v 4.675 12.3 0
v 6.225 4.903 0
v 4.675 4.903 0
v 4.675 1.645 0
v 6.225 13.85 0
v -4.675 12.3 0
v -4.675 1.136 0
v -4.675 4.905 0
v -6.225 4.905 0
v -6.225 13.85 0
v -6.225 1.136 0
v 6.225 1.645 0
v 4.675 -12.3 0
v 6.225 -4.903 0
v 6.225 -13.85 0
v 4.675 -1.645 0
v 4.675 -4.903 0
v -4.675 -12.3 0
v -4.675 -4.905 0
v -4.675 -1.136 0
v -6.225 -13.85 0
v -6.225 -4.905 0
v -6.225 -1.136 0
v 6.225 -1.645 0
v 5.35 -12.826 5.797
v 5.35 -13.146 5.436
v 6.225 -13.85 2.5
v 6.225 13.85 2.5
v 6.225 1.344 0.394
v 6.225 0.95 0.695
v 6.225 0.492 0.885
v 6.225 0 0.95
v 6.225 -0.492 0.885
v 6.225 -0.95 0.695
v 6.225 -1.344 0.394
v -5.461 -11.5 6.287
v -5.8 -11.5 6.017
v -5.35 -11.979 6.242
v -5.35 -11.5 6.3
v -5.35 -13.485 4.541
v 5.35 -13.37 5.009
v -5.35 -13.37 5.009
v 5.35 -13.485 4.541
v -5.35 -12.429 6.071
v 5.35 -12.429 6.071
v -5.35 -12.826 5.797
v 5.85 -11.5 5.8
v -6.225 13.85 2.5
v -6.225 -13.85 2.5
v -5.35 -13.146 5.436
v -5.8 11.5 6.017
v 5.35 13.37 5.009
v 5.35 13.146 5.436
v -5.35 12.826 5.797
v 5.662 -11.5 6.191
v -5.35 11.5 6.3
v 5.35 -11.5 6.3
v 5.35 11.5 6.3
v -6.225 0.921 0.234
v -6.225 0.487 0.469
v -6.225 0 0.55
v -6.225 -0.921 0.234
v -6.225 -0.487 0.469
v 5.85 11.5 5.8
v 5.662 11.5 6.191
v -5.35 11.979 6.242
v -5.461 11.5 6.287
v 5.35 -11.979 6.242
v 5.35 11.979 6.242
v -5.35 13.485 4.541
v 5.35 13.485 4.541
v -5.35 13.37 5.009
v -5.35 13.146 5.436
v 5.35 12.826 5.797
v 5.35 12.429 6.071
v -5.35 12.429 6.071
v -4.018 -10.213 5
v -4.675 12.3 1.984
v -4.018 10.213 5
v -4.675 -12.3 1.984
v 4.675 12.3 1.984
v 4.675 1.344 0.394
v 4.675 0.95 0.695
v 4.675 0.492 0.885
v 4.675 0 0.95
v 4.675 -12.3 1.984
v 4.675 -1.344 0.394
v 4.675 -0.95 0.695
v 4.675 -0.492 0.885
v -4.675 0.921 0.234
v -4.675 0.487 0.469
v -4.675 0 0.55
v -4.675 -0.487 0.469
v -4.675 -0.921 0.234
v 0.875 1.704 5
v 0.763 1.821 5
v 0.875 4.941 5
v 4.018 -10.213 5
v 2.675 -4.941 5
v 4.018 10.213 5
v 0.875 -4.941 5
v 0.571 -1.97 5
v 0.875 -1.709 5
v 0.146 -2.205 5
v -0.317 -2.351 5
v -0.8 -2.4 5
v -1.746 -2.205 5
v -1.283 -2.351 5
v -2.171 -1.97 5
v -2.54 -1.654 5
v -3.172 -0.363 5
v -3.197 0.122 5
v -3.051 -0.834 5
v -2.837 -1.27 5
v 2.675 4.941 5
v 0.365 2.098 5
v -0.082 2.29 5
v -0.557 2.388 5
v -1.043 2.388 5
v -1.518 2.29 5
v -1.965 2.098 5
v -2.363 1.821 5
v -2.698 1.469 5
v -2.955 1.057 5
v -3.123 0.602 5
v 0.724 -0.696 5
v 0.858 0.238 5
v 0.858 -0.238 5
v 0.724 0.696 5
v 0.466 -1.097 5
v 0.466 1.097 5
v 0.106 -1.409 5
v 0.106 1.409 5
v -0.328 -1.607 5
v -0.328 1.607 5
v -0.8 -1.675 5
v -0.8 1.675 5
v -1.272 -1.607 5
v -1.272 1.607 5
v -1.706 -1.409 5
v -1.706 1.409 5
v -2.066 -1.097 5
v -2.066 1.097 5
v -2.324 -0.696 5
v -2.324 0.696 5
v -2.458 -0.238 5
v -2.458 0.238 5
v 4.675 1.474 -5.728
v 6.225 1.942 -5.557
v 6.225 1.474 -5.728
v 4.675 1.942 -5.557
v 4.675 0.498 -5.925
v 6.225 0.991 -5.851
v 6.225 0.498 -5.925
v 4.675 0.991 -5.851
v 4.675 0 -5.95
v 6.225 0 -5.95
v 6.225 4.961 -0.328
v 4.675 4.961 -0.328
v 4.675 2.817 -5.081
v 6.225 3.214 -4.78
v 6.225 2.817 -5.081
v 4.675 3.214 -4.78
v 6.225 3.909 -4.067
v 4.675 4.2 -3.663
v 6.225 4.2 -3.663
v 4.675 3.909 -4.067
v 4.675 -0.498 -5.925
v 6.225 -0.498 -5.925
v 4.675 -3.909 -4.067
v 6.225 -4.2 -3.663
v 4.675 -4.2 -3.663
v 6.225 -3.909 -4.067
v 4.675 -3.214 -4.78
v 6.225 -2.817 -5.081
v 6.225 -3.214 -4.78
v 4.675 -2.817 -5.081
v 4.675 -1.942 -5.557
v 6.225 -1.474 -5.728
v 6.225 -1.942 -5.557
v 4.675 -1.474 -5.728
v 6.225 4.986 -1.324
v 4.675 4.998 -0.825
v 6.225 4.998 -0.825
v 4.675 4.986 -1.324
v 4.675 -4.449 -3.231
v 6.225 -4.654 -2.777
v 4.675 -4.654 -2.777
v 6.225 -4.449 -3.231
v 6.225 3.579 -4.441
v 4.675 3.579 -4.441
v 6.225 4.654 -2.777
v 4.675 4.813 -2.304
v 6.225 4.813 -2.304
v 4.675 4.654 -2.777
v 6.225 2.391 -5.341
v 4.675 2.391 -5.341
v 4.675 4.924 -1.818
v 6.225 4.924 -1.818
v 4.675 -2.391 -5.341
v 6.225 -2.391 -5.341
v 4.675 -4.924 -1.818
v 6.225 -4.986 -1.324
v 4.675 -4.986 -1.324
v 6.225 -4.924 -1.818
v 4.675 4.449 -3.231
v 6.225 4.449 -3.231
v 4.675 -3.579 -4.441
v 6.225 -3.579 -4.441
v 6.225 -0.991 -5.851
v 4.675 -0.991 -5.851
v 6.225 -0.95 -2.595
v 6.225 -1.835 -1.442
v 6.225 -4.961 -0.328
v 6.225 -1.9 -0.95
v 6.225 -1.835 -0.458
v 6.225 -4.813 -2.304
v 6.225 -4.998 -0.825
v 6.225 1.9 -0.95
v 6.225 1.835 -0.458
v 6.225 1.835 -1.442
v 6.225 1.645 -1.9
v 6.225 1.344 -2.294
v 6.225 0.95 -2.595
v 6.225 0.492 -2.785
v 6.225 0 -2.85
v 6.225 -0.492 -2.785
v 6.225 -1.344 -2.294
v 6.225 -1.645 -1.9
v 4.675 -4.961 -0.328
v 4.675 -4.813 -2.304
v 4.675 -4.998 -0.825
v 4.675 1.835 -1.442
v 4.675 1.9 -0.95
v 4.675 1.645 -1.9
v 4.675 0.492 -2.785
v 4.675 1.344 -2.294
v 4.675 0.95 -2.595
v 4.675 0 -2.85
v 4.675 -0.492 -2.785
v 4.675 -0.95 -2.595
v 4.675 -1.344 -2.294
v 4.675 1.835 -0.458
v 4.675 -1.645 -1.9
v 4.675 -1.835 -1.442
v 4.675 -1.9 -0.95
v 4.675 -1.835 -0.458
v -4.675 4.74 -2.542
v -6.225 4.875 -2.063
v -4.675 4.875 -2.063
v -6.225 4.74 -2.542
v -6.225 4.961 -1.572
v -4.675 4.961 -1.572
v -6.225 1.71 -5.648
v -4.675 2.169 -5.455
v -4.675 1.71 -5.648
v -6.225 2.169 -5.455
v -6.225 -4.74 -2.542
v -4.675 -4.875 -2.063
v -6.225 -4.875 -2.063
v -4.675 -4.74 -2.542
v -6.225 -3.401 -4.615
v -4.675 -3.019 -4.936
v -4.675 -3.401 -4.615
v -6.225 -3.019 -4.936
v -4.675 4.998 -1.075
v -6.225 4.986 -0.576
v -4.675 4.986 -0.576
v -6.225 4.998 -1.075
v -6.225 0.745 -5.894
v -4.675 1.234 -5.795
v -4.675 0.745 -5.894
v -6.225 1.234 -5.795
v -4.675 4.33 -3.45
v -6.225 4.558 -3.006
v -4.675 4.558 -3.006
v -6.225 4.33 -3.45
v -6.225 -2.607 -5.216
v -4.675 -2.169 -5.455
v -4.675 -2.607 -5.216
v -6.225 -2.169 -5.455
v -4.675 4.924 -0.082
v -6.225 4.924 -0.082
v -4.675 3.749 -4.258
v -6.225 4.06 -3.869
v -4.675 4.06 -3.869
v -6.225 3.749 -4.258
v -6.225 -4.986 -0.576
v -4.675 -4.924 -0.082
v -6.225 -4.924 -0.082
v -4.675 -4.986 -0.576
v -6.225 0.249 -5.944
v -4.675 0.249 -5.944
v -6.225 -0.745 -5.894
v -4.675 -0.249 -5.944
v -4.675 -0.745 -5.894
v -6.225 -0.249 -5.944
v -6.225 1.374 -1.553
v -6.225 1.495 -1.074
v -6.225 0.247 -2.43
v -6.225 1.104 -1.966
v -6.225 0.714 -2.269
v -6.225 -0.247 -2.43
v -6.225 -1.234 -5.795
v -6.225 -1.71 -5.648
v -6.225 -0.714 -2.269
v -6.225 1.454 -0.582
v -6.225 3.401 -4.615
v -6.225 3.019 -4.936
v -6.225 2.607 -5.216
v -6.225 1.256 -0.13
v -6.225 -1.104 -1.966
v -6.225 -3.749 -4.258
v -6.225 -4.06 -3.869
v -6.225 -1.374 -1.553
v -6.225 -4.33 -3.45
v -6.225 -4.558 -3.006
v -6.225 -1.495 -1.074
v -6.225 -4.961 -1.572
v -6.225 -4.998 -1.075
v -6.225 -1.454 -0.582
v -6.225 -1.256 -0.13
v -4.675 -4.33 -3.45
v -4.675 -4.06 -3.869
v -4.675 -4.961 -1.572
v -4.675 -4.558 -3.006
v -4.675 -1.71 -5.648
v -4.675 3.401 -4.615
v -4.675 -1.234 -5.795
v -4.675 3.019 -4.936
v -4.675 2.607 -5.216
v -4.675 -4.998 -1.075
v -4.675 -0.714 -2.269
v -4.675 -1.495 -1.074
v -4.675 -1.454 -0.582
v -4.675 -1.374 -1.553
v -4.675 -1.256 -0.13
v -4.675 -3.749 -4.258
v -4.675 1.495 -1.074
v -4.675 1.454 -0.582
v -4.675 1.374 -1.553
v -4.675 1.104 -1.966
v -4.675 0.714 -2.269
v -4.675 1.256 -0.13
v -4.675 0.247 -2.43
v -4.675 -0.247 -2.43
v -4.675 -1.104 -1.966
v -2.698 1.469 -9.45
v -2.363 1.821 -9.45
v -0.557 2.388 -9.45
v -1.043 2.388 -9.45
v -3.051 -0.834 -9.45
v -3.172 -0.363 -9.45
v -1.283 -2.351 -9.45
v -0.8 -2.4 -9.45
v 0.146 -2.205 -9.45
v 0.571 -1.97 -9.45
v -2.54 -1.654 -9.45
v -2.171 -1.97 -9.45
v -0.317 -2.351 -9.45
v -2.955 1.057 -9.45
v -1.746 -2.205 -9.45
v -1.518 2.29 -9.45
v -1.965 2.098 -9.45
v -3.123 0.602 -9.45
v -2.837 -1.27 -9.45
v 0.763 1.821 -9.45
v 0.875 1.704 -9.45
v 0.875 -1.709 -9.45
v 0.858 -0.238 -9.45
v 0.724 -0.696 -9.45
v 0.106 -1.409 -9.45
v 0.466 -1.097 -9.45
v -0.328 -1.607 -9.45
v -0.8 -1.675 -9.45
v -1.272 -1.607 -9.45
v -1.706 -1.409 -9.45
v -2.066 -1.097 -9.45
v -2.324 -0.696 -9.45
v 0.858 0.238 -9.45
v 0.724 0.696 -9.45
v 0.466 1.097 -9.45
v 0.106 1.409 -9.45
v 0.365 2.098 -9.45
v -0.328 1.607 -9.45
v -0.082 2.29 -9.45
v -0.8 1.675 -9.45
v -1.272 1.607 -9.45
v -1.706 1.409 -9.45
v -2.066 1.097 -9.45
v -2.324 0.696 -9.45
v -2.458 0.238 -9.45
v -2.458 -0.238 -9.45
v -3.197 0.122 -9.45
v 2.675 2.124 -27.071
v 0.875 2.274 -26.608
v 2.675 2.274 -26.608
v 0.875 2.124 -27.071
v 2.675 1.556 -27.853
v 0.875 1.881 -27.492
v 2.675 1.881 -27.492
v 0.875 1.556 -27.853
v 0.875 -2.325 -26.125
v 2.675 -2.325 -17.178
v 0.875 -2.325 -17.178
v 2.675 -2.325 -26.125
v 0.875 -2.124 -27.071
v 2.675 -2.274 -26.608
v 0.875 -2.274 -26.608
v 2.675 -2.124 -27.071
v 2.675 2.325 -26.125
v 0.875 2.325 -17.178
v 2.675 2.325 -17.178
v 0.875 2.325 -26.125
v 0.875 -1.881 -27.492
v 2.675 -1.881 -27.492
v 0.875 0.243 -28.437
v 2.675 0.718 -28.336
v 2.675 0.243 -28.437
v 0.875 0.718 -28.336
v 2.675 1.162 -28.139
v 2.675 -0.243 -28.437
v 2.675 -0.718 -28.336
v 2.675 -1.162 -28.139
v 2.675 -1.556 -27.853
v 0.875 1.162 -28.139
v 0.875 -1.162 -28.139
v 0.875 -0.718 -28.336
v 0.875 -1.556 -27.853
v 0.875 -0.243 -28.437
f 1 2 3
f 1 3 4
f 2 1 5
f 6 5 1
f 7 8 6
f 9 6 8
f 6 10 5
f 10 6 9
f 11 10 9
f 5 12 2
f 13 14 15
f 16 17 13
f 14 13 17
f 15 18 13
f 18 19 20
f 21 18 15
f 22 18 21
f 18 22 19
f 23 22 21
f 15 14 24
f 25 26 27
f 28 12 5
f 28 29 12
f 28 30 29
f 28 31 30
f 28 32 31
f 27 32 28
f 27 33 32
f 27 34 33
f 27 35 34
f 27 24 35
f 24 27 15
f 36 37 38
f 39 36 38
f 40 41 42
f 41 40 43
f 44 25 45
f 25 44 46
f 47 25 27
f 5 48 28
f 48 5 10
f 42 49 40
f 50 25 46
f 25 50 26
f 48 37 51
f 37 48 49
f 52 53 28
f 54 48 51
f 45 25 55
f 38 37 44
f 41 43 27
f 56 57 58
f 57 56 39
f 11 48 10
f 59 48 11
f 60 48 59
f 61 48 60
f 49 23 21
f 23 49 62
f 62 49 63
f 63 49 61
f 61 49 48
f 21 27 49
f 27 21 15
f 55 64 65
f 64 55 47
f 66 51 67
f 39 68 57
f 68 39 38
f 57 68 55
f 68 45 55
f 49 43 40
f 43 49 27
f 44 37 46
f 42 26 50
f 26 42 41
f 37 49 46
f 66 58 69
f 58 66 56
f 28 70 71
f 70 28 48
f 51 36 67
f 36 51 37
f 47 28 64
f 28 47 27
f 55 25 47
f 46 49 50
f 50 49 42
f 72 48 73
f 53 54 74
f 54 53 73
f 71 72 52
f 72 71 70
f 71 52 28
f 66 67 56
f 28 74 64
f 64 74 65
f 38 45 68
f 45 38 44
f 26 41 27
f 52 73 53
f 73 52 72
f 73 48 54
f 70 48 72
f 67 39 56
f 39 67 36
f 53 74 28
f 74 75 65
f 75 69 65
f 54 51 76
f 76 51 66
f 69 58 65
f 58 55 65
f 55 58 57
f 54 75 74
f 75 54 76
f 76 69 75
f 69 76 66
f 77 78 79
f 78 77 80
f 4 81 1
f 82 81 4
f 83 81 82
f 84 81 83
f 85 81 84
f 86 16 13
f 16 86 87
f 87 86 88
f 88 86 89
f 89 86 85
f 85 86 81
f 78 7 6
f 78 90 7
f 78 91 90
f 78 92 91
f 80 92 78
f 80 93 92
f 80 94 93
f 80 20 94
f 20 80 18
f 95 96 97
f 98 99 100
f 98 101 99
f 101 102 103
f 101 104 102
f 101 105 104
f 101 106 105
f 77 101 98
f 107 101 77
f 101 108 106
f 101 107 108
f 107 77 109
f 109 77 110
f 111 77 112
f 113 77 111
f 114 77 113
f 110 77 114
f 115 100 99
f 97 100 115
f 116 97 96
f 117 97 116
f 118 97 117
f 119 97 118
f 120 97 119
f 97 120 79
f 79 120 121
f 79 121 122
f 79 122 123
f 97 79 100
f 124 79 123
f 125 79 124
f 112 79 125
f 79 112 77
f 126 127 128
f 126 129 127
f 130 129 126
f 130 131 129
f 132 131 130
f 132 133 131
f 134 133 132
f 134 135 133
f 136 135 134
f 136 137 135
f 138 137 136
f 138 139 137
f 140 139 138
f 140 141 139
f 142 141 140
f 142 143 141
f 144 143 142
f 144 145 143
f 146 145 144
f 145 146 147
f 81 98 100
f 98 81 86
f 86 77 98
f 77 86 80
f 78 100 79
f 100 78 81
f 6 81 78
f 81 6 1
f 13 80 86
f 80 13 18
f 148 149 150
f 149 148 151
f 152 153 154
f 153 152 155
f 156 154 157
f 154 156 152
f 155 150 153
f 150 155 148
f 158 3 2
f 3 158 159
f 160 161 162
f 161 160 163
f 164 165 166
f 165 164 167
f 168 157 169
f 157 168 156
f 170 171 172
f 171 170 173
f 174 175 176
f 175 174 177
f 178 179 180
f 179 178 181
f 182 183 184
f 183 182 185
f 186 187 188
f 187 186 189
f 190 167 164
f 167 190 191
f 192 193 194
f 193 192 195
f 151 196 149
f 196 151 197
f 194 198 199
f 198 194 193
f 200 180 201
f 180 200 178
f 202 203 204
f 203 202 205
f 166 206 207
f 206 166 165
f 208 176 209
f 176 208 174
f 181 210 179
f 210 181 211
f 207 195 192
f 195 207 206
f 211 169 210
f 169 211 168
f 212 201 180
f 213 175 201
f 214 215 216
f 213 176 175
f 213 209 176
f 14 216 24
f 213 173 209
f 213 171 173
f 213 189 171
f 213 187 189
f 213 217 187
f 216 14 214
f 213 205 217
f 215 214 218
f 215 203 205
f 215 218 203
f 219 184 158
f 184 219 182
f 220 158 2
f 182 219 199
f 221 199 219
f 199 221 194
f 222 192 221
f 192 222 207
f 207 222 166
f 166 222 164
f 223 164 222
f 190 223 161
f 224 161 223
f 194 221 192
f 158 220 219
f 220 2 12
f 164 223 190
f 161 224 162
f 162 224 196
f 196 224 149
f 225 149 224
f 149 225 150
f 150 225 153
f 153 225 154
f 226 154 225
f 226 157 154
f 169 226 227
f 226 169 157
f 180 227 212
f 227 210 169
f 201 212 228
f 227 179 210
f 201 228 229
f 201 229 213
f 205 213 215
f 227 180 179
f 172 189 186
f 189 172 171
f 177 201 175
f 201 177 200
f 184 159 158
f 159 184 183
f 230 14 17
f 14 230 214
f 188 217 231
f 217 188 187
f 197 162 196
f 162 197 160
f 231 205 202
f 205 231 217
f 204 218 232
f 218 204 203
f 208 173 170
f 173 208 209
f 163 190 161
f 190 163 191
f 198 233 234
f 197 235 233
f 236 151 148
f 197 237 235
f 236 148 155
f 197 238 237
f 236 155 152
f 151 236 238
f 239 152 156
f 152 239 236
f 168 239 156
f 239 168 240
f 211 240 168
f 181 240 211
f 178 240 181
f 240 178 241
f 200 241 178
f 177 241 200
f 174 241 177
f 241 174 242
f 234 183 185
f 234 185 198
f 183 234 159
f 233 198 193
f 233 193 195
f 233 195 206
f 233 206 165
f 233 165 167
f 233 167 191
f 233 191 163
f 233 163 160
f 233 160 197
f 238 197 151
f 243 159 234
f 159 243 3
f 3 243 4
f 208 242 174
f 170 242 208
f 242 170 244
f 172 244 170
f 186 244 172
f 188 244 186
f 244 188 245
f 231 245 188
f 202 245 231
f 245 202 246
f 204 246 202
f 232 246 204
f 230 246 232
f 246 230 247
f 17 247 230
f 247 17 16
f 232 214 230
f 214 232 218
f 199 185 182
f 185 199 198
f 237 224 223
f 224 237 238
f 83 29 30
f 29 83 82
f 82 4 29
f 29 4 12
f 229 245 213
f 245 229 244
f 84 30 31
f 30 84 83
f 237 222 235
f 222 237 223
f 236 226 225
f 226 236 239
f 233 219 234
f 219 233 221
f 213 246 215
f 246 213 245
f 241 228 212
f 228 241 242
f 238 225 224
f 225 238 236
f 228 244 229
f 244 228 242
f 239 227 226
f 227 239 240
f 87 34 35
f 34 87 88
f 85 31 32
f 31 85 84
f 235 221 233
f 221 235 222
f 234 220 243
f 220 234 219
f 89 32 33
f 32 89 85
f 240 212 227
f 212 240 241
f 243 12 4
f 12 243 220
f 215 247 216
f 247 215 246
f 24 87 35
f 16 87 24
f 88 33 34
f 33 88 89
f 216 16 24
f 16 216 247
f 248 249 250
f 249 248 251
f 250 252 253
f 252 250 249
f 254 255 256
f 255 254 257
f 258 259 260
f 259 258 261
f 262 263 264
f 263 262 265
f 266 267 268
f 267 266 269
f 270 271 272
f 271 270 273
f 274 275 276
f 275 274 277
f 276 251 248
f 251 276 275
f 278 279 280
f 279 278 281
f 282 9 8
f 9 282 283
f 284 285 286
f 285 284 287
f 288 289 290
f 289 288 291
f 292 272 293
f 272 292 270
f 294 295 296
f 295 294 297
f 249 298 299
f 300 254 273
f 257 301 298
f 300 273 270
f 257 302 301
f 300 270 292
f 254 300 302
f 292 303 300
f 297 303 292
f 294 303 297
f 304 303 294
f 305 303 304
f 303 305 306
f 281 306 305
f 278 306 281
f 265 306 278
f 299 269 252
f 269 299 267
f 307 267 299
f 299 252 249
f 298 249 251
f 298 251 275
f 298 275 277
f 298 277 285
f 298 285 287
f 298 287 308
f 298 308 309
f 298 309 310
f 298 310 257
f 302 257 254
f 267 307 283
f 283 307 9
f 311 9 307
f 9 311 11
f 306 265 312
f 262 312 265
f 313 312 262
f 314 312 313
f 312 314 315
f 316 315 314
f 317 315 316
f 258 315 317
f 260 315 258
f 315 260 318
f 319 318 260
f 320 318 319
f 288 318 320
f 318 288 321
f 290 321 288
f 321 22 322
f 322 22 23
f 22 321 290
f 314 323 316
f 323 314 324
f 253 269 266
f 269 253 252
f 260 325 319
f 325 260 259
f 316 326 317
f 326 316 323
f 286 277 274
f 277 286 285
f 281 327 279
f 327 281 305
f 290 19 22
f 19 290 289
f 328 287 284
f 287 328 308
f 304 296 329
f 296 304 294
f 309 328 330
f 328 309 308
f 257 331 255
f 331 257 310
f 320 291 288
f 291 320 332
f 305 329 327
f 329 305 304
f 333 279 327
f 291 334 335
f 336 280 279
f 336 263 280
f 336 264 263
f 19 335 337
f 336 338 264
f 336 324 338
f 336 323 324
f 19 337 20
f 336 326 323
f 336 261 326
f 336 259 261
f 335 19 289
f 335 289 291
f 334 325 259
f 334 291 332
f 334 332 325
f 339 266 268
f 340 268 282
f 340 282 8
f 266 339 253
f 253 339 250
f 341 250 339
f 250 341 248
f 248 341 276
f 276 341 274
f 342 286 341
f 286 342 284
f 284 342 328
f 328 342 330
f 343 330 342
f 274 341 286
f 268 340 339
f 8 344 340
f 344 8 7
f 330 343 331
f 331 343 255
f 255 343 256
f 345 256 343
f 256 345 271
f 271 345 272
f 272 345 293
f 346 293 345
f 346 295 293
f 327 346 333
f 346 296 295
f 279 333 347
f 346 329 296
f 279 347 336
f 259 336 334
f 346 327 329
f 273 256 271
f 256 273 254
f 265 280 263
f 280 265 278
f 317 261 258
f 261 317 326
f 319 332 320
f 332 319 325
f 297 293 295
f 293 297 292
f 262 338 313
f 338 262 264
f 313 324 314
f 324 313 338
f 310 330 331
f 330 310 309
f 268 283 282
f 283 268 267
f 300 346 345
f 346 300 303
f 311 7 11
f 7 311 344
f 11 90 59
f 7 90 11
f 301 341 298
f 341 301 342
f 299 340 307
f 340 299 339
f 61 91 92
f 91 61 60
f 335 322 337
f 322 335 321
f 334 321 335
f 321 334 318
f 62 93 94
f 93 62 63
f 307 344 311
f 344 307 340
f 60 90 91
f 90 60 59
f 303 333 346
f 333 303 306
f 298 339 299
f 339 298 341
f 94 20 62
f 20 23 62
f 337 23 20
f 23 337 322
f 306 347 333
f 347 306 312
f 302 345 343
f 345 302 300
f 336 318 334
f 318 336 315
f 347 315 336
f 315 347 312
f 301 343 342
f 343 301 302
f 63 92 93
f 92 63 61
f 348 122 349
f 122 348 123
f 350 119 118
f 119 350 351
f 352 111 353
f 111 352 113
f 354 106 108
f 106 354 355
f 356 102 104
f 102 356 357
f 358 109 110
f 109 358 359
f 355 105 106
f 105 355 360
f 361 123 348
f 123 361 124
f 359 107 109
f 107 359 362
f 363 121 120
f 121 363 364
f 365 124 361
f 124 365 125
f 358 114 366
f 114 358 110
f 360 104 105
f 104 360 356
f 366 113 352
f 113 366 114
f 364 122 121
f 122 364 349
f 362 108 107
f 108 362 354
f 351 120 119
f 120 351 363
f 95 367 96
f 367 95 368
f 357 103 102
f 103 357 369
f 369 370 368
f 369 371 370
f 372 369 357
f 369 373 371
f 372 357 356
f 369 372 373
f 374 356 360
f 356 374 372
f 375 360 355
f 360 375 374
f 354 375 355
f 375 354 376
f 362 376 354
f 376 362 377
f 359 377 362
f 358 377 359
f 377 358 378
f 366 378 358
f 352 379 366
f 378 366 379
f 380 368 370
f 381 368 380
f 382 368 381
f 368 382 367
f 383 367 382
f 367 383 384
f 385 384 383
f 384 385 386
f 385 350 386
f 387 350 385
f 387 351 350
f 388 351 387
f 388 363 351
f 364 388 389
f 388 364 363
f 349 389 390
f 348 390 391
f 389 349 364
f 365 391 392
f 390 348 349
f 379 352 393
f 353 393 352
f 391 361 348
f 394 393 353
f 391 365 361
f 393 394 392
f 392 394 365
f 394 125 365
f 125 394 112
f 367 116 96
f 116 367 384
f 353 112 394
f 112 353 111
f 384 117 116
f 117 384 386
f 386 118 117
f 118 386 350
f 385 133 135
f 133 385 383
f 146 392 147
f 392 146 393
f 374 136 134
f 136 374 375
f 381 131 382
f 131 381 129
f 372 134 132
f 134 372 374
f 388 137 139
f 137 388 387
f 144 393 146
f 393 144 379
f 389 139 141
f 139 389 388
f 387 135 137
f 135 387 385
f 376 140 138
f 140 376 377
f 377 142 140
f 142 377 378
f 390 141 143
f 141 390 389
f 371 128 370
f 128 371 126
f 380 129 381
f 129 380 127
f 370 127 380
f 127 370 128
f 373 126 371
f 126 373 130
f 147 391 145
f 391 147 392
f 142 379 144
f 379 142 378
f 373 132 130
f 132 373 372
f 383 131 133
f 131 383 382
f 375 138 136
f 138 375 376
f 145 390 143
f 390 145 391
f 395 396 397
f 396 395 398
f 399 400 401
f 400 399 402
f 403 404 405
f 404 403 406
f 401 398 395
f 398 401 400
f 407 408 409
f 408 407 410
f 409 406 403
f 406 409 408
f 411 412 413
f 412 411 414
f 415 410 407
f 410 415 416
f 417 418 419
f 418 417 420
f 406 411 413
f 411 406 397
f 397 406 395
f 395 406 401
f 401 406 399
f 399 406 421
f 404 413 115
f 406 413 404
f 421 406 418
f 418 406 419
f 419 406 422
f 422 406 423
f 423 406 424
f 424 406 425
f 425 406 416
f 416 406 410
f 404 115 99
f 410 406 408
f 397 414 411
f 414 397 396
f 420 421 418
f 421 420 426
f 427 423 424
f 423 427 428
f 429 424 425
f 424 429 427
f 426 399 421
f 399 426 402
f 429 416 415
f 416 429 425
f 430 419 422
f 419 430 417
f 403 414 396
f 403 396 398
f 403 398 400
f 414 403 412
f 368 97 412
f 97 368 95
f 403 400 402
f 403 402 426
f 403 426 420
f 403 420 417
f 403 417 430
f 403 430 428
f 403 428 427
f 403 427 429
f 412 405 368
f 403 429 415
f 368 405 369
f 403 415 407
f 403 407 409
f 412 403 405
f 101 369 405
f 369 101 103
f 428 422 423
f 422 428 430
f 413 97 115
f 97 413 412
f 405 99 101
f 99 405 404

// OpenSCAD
$fa=1;
$fs=0.5;


module rounded_button_top() {
    hull() {
        translate([0,-11.5,4.3]) {
            rotate([0,90,0]) cylinder(r=2, h=10.7, center=true);
        }
        translate([0,11.5,4.3]) {
            rotate([0,90,0]) cylinder(r=2, h=10.7, center=true);
        }
        translate([10.7/2,0,5.8]) {
            rotate([90,0,0]) cylinder(r=0.5, h=23, center=true);
        }
        translate([-10.7/2,0,5.8]) {
            rotate([90,0,0]) cylinder(r=0.5, h=23, center=true);
        }
        translate([0,0,2.5/2]) cube([12.45, 27.7, 2.5], center=true);
    }
}

module button_top() {
    difference() {
    rounded_button_top();
    scale([9.35/12.45, 24.6/27.7, 5.0/6.3]) button_top_shape();
}
}

module button_top_shape() {
    hull() {
        translate([0,0,6.3/2]) cube([10.7, 23.0, 6.3], center=true);
        translate([0,0,2.5/2]) cube([12.45, 27.7, 2.5], center=true);
    }
}

module bt_with_rear_hole_tab() {
    difference() {
        union() {
            button_top();
            
            //tab for hole
            //translate([12.45/2-1.55,-5,-5]) cube([1.55,10,6]);
            translate([12.45/2-1.55,0,-0.95]) {
                rotate([0,90,0]) {
                    intersection() {
                        cylinder(r=5, h=1.55);
                        translate([3,0,0]) cube(10, center=true);
                    }
                }
            }
        }

        //larger rear hole
        translate([12.45/2-1.6,0,-0.95]) {
            rotate([0,90,0]) cylinder(r=1.9, h=1.8);
        }
    }
}
module bt_with_front_hole_tab() {
    difference() {
        union() {
            bt_with_rear_hole_tab();
            
            //tab for hole
            //translate([12.45/2-1.55,-5,-5]) cube([1.55,10,6]);
            translate([-(12.45/2-1.55),0,-0.95]) {
                rotate([0,-90,0]) {
                    intersection() {
                        cylinder(r=5, h=1.55);
                        translate([-3,0,0]) cube(10, center=true);
                    }
                }
            }
        }

        //smaller front hole
        translate([-(12.45/2-1.6),0,-0.95]) {
            rotate([0,-90,0]) cylinder(r=1.5, h=1.8);
        }
    }
}

module springtube() {
    difference() {
        cylinder(r=4.8/2, h=15);
        translate([0,0,-0.1]) cylinder(r=3.35/2, h=15.2);
    }
}

module switch_actuator_with_spring() {
    union() {
        hull() {
            cylinder(r=4.65/2, h=1.8);
            translate([0,4.5,0.9]) cube([4.65, 9.0, 1.8], center=true);
        }
        hull() {
            translate([0,9.0,0]) cylinder(r=4.65/2, h=1.8);
            translate([0,34-4.65/2,0.9]) cube([10, 0.1, 1.8], center=true);
        }
        rotate([-90,0,0]) {
            translate([0,-(1.8+3.35/2),19-4.65/2]) springtube();
        }
    }
}


union() {
    bt_with_front_hole_tab();
    translate([12.45/2-3.55,0,-(28.45-4.65/2)]) {
        rotate([0,0,-90]) {
            rotate([90,0,0]) {
                switch_actuator_with_spring();
            }
        }
    }
}
